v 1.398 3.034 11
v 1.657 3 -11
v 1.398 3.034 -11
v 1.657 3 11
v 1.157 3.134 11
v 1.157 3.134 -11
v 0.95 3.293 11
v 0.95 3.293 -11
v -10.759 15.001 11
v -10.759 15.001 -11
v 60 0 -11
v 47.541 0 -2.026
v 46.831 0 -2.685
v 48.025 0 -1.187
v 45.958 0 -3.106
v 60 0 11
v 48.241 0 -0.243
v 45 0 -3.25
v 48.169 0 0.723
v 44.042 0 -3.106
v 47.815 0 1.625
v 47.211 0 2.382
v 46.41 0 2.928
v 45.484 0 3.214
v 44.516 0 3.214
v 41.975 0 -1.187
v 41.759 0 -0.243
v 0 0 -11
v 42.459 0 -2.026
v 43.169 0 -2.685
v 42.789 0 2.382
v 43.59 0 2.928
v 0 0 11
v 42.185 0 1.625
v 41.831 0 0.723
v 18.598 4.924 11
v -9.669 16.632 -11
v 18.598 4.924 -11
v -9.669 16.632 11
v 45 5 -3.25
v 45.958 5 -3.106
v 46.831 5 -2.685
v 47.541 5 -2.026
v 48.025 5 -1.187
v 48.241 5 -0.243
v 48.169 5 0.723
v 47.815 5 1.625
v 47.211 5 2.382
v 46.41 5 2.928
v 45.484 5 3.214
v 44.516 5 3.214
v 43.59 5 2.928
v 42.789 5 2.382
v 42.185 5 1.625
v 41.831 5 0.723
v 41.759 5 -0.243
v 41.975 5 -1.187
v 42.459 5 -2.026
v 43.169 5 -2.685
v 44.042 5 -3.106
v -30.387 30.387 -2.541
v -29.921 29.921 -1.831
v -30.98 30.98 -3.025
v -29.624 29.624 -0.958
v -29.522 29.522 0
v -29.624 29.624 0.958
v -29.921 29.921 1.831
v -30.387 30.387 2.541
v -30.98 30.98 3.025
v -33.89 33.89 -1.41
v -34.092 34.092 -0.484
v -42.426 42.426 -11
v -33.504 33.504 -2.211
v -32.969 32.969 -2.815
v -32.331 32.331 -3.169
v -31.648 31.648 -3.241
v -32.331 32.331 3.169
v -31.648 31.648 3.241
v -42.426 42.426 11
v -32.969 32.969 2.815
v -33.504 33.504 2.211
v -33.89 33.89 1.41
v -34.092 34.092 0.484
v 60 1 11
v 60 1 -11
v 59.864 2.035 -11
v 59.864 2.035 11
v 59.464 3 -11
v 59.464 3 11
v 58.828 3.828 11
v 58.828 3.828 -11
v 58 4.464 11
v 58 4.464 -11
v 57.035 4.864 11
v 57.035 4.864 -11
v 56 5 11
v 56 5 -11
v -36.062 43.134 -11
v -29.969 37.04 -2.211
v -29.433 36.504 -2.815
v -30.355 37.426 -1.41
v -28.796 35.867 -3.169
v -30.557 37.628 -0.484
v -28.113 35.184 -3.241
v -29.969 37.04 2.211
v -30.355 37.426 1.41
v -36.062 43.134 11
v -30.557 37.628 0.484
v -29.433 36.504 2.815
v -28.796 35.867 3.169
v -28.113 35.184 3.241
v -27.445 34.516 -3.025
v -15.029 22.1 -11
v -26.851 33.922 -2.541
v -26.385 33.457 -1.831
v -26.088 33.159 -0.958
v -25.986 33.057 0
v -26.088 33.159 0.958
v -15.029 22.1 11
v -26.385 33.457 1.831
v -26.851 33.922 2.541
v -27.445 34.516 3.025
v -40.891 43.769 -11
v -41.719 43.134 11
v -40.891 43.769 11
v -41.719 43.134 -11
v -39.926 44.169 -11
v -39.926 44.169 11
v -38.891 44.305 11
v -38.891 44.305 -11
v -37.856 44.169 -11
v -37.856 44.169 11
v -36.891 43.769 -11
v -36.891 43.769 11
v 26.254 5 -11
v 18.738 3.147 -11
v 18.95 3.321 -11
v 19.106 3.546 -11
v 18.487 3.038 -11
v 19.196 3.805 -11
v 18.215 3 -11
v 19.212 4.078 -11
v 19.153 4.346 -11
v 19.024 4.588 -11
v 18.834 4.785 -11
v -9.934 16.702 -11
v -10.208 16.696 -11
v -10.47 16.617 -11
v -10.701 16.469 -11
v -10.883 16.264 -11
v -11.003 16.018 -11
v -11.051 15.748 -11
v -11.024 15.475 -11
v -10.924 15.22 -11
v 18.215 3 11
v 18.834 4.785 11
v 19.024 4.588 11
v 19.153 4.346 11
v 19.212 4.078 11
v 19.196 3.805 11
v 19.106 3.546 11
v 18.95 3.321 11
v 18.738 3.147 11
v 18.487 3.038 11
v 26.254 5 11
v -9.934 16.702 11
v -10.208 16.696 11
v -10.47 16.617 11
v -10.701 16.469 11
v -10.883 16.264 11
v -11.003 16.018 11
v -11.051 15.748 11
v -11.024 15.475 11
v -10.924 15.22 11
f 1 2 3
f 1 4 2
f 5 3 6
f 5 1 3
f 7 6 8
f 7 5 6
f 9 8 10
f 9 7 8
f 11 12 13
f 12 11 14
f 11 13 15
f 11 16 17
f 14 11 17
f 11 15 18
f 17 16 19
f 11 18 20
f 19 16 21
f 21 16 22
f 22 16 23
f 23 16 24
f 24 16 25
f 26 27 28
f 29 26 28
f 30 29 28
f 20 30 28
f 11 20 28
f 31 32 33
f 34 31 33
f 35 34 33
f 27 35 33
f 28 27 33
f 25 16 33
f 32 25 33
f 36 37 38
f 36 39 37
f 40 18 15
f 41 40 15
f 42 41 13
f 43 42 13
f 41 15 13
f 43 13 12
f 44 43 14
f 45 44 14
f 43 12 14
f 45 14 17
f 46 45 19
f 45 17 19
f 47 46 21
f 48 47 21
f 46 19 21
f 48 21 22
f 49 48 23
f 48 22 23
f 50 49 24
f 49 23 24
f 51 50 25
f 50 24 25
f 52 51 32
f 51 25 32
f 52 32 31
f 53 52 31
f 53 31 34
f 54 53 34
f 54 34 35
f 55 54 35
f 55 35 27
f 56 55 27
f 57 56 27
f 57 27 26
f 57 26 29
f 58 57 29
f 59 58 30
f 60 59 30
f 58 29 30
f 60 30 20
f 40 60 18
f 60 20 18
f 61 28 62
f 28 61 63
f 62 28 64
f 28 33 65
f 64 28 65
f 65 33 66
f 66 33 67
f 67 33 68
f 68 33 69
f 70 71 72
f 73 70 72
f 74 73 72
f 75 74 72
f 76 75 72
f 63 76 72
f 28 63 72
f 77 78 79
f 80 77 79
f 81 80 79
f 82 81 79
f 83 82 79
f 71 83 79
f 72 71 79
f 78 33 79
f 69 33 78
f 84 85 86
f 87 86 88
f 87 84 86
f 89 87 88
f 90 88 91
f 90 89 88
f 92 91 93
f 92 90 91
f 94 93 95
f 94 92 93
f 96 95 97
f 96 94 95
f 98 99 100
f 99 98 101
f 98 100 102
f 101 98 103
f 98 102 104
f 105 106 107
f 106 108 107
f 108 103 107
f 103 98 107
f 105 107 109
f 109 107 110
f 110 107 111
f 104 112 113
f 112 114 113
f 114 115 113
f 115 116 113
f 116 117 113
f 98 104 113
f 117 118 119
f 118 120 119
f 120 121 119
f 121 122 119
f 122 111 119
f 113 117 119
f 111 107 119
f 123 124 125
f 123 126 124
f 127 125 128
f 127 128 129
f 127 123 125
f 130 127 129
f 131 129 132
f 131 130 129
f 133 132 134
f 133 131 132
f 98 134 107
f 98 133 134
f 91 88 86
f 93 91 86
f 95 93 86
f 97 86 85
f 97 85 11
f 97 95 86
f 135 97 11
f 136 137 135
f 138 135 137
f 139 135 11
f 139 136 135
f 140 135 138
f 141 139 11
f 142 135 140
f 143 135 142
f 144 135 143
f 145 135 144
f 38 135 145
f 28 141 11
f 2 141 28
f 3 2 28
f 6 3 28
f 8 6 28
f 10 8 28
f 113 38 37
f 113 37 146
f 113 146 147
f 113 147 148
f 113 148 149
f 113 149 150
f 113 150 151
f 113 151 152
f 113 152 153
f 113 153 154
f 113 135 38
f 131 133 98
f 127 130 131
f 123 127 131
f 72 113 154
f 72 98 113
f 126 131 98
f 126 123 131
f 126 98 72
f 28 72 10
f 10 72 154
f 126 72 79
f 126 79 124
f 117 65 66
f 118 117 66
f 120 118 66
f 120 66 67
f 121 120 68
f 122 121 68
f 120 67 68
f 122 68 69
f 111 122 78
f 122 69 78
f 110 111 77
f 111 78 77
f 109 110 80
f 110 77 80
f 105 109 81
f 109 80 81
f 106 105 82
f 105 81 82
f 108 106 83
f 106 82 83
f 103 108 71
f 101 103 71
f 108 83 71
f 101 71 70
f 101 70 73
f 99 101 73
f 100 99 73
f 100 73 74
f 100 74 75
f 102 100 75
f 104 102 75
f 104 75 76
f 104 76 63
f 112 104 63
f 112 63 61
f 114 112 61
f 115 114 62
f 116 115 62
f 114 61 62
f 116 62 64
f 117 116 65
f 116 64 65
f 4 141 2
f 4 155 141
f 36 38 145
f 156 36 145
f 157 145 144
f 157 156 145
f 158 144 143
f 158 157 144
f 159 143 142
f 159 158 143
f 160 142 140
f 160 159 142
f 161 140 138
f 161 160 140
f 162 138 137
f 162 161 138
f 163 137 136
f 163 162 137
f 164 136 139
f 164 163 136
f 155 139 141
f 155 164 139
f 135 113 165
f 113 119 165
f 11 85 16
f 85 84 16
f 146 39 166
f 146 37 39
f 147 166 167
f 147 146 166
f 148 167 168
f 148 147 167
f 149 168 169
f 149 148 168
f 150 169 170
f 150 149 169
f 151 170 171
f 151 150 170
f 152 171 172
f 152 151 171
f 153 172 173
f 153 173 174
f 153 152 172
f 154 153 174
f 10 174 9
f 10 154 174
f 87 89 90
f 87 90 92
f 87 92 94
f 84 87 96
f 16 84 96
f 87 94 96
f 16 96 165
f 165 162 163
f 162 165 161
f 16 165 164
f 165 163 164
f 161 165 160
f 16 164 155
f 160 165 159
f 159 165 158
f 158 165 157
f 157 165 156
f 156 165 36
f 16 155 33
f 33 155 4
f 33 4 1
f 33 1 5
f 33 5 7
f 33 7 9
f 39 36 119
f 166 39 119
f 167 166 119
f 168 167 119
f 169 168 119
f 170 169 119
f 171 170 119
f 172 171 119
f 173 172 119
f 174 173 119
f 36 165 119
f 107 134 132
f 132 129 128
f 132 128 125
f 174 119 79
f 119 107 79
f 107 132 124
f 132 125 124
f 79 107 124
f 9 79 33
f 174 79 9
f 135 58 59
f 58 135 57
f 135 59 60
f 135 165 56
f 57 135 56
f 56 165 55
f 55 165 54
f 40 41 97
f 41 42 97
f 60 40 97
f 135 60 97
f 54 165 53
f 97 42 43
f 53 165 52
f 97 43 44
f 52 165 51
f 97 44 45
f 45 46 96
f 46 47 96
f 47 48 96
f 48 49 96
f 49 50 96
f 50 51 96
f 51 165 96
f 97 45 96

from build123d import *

# Parameters (mm, degrees)
EXTRUDE_1_DEPTH     = 11
SKETCH_2_R          = 3.25
CUT_EXTRUDE_1_DEPTH = 5
SKETCH_3_R          = 3.25
CUT_EXTRUDE_2_DEPTH = 5
FILLET_1_R          = 4
FILLET_2_R          = 1


with BuildPart() as part:
    # Эскиз1 → Бобышка-Вытянуть1 (new body, symmetric)
    with BuildSketch(Plane.XY):
        Polygon((0, 0), (-42.426406871, 42.426406871), (-38.890872965, 45.961940777), (-15.028558569, 22.099626381), (26.253591352, 5), (60, 5), (60, 0), align=None)
        Polygon((-14.313708499, 18.556349186), (23.242640687, 3), (1.242640687, 3), align=None, mode=Mode.SUBTRACT)
    extrude(amount=EXTRUDE_1_DEPTH, both=True)

    # Эскиз2 → Вырез-Вытянуть1 (cut)
    with BuildSketch(Plane(origin=(0, 0, 0), x_dir=(0, 0, 1), z_dir=(-0.707106781, -0.707106781, 0))):
        with Locations(Location((0, 45, 0), (0, 0, 270))):  # turned: the seam where the file's is
            Circle(SKETCH_2_R)
    extrude(amount=-CUT_EXTRUDE_1_DEPTH, mode=Mode.SUBTRACT)

    # Эскиз3 → Вырез-Вытянуть2 (cut)
    with BuildSketch(Plane.XZ):
        with Locations(Location((45, 0, 0), (0, 0, 270))):  # turned: the seam where the file's is
            Circle(SKETCH_3_R)
    extrude(amount=-CUT_EXTRUDE_2_DEPTH, mode=Mode.SUBTRACT)

    # Скругление1
    fillet_1_edges = [part.edges().sort_by_distance(p)[0] for p in [
        (-38.890872965, 45.961940777, 0),
        (60, 5, 0),
    ]]
    fillet(fillet_1_edges, radius=FILLET_1_R)

    # Скругление2
    fillet_2_edges = [part.edges().sort_by_distance(p)[0] for p in [
        (-14.313708499, 18.556349186, 0),
        (1.242640687, 3, 0),
        (23.242640687, 3, 0),
    ]]
    fillet(fillet_2_edges, radius=FILLET_2_R)


solid = part.part
